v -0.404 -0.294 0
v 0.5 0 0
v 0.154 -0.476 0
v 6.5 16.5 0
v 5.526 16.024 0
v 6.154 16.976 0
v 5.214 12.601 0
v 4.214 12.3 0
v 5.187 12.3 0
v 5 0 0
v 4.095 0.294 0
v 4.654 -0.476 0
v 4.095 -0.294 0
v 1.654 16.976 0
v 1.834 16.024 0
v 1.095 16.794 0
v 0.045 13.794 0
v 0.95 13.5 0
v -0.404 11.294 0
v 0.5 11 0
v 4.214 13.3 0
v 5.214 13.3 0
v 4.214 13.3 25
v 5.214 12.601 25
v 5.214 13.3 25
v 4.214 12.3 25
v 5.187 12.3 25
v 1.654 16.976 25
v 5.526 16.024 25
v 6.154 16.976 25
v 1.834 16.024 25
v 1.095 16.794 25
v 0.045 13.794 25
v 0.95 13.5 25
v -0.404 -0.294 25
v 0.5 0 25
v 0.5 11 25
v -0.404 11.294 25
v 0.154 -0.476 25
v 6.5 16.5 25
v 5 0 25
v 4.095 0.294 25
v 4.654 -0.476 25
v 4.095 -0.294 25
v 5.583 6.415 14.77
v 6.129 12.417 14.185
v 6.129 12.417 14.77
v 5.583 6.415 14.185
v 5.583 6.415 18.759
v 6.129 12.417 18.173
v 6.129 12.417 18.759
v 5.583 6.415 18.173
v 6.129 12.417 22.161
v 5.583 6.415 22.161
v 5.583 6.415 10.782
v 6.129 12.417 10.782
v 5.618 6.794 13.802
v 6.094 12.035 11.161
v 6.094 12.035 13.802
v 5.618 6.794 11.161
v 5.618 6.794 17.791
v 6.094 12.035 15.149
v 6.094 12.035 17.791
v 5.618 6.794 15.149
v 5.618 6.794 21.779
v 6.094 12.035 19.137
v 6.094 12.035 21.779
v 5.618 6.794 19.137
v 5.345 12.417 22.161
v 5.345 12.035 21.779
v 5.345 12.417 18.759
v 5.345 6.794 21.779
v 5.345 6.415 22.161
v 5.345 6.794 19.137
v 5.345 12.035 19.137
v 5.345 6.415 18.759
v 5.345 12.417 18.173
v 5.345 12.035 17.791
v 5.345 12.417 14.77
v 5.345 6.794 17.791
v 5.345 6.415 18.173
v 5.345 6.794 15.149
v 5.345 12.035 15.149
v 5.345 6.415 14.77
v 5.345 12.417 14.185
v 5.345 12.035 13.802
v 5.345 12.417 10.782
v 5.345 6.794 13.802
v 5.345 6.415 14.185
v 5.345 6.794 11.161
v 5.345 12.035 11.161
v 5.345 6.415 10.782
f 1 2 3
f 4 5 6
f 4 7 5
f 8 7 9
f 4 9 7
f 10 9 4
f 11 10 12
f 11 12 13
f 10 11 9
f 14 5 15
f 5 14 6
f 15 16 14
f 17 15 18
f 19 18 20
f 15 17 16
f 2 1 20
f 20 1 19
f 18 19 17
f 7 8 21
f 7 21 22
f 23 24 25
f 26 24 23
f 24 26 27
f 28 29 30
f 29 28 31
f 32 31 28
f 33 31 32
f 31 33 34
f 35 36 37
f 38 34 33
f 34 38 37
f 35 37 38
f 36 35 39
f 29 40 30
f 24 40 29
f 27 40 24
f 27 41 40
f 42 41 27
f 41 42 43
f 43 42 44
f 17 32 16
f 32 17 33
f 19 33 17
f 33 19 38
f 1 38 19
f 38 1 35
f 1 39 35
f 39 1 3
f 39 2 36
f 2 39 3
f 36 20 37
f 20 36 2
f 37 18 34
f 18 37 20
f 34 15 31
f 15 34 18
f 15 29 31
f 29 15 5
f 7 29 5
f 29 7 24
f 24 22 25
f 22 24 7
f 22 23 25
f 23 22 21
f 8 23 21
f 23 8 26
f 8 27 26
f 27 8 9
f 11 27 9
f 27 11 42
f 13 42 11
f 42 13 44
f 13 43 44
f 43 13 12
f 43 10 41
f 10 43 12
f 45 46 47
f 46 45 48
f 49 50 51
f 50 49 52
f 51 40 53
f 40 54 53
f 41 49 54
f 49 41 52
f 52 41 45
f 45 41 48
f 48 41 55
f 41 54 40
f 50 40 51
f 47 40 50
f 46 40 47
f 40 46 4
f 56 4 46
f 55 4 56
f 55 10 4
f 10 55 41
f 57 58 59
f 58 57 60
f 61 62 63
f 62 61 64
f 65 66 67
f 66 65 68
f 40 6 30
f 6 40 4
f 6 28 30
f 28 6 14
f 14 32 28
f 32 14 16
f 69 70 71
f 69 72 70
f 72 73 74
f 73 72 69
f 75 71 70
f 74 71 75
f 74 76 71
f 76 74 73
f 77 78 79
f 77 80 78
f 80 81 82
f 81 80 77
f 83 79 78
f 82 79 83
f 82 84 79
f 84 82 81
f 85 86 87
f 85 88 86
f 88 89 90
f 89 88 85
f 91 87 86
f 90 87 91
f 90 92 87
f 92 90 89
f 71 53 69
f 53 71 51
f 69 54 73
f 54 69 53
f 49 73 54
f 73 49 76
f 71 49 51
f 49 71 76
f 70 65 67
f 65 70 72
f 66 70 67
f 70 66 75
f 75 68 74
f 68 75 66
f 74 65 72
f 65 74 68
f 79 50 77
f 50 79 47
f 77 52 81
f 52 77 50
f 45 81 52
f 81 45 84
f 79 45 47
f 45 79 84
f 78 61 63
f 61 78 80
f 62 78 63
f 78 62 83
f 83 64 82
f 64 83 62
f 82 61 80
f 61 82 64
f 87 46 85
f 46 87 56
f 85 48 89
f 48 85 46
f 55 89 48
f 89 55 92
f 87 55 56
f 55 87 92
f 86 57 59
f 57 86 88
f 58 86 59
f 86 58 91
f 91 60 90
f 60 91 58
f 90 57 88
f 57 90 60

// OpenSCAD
//
// MacBook pro 2015

// unit is millimeter

t = 1.0; // thickness
h = 16.0; // height
d0 = 5.0; // rear depth
d1 = 3.5; // front depth
l = 25.0; // length

difference() {
  //translate([ t / 2, 0, 0 ])
  linear_extrude(height=l) {
    hull() {
      translate([ 0, 0, 0 ]) circle(t / 2);
      translate([ 0, h - 5 * t, 0 ]) circle(t / 2);
    }
    hull() {
      translate([ 0, h - 5 * t, 0 ]) circle(t / 2);
      translate([ 0.45 * t, h - 2.5 * t, 0 ]) circle(t / 2);
    }
    hull() {
      translate([ 0.45 * t, h - 2.5 * t, 0 ]) circle(t / 2);
      translate([ 1.5 * t, h + t / 2, 0 ]) circle(t / 2);
    }
    hull() {
      translate([ 1.5 * t, h + t / 2, 0 ]) circle(t / 2);
      translate([ d0 + t, h + t / 2, 0 ]) circle(t / 2);
    }
    hull() {
      translate([ d0 + t, h + t / 2, 0 ]) circle(t / 2);
      translate([ d1 + t, 0, 0 ]) circle(t / 2);
    }
    translate([ d0 - t / 3.5 - t / 2, h - t - 2.7, 0 ]) square(t);
  }
  translate([ d0 + t / 2.9, h / 2.1, l * 0.9 ]) rotate([ 90, 90, 90 ])
    linear_extrude(height=2) text("思想罪", font="Hiragino Sans", size=4.9);
}
